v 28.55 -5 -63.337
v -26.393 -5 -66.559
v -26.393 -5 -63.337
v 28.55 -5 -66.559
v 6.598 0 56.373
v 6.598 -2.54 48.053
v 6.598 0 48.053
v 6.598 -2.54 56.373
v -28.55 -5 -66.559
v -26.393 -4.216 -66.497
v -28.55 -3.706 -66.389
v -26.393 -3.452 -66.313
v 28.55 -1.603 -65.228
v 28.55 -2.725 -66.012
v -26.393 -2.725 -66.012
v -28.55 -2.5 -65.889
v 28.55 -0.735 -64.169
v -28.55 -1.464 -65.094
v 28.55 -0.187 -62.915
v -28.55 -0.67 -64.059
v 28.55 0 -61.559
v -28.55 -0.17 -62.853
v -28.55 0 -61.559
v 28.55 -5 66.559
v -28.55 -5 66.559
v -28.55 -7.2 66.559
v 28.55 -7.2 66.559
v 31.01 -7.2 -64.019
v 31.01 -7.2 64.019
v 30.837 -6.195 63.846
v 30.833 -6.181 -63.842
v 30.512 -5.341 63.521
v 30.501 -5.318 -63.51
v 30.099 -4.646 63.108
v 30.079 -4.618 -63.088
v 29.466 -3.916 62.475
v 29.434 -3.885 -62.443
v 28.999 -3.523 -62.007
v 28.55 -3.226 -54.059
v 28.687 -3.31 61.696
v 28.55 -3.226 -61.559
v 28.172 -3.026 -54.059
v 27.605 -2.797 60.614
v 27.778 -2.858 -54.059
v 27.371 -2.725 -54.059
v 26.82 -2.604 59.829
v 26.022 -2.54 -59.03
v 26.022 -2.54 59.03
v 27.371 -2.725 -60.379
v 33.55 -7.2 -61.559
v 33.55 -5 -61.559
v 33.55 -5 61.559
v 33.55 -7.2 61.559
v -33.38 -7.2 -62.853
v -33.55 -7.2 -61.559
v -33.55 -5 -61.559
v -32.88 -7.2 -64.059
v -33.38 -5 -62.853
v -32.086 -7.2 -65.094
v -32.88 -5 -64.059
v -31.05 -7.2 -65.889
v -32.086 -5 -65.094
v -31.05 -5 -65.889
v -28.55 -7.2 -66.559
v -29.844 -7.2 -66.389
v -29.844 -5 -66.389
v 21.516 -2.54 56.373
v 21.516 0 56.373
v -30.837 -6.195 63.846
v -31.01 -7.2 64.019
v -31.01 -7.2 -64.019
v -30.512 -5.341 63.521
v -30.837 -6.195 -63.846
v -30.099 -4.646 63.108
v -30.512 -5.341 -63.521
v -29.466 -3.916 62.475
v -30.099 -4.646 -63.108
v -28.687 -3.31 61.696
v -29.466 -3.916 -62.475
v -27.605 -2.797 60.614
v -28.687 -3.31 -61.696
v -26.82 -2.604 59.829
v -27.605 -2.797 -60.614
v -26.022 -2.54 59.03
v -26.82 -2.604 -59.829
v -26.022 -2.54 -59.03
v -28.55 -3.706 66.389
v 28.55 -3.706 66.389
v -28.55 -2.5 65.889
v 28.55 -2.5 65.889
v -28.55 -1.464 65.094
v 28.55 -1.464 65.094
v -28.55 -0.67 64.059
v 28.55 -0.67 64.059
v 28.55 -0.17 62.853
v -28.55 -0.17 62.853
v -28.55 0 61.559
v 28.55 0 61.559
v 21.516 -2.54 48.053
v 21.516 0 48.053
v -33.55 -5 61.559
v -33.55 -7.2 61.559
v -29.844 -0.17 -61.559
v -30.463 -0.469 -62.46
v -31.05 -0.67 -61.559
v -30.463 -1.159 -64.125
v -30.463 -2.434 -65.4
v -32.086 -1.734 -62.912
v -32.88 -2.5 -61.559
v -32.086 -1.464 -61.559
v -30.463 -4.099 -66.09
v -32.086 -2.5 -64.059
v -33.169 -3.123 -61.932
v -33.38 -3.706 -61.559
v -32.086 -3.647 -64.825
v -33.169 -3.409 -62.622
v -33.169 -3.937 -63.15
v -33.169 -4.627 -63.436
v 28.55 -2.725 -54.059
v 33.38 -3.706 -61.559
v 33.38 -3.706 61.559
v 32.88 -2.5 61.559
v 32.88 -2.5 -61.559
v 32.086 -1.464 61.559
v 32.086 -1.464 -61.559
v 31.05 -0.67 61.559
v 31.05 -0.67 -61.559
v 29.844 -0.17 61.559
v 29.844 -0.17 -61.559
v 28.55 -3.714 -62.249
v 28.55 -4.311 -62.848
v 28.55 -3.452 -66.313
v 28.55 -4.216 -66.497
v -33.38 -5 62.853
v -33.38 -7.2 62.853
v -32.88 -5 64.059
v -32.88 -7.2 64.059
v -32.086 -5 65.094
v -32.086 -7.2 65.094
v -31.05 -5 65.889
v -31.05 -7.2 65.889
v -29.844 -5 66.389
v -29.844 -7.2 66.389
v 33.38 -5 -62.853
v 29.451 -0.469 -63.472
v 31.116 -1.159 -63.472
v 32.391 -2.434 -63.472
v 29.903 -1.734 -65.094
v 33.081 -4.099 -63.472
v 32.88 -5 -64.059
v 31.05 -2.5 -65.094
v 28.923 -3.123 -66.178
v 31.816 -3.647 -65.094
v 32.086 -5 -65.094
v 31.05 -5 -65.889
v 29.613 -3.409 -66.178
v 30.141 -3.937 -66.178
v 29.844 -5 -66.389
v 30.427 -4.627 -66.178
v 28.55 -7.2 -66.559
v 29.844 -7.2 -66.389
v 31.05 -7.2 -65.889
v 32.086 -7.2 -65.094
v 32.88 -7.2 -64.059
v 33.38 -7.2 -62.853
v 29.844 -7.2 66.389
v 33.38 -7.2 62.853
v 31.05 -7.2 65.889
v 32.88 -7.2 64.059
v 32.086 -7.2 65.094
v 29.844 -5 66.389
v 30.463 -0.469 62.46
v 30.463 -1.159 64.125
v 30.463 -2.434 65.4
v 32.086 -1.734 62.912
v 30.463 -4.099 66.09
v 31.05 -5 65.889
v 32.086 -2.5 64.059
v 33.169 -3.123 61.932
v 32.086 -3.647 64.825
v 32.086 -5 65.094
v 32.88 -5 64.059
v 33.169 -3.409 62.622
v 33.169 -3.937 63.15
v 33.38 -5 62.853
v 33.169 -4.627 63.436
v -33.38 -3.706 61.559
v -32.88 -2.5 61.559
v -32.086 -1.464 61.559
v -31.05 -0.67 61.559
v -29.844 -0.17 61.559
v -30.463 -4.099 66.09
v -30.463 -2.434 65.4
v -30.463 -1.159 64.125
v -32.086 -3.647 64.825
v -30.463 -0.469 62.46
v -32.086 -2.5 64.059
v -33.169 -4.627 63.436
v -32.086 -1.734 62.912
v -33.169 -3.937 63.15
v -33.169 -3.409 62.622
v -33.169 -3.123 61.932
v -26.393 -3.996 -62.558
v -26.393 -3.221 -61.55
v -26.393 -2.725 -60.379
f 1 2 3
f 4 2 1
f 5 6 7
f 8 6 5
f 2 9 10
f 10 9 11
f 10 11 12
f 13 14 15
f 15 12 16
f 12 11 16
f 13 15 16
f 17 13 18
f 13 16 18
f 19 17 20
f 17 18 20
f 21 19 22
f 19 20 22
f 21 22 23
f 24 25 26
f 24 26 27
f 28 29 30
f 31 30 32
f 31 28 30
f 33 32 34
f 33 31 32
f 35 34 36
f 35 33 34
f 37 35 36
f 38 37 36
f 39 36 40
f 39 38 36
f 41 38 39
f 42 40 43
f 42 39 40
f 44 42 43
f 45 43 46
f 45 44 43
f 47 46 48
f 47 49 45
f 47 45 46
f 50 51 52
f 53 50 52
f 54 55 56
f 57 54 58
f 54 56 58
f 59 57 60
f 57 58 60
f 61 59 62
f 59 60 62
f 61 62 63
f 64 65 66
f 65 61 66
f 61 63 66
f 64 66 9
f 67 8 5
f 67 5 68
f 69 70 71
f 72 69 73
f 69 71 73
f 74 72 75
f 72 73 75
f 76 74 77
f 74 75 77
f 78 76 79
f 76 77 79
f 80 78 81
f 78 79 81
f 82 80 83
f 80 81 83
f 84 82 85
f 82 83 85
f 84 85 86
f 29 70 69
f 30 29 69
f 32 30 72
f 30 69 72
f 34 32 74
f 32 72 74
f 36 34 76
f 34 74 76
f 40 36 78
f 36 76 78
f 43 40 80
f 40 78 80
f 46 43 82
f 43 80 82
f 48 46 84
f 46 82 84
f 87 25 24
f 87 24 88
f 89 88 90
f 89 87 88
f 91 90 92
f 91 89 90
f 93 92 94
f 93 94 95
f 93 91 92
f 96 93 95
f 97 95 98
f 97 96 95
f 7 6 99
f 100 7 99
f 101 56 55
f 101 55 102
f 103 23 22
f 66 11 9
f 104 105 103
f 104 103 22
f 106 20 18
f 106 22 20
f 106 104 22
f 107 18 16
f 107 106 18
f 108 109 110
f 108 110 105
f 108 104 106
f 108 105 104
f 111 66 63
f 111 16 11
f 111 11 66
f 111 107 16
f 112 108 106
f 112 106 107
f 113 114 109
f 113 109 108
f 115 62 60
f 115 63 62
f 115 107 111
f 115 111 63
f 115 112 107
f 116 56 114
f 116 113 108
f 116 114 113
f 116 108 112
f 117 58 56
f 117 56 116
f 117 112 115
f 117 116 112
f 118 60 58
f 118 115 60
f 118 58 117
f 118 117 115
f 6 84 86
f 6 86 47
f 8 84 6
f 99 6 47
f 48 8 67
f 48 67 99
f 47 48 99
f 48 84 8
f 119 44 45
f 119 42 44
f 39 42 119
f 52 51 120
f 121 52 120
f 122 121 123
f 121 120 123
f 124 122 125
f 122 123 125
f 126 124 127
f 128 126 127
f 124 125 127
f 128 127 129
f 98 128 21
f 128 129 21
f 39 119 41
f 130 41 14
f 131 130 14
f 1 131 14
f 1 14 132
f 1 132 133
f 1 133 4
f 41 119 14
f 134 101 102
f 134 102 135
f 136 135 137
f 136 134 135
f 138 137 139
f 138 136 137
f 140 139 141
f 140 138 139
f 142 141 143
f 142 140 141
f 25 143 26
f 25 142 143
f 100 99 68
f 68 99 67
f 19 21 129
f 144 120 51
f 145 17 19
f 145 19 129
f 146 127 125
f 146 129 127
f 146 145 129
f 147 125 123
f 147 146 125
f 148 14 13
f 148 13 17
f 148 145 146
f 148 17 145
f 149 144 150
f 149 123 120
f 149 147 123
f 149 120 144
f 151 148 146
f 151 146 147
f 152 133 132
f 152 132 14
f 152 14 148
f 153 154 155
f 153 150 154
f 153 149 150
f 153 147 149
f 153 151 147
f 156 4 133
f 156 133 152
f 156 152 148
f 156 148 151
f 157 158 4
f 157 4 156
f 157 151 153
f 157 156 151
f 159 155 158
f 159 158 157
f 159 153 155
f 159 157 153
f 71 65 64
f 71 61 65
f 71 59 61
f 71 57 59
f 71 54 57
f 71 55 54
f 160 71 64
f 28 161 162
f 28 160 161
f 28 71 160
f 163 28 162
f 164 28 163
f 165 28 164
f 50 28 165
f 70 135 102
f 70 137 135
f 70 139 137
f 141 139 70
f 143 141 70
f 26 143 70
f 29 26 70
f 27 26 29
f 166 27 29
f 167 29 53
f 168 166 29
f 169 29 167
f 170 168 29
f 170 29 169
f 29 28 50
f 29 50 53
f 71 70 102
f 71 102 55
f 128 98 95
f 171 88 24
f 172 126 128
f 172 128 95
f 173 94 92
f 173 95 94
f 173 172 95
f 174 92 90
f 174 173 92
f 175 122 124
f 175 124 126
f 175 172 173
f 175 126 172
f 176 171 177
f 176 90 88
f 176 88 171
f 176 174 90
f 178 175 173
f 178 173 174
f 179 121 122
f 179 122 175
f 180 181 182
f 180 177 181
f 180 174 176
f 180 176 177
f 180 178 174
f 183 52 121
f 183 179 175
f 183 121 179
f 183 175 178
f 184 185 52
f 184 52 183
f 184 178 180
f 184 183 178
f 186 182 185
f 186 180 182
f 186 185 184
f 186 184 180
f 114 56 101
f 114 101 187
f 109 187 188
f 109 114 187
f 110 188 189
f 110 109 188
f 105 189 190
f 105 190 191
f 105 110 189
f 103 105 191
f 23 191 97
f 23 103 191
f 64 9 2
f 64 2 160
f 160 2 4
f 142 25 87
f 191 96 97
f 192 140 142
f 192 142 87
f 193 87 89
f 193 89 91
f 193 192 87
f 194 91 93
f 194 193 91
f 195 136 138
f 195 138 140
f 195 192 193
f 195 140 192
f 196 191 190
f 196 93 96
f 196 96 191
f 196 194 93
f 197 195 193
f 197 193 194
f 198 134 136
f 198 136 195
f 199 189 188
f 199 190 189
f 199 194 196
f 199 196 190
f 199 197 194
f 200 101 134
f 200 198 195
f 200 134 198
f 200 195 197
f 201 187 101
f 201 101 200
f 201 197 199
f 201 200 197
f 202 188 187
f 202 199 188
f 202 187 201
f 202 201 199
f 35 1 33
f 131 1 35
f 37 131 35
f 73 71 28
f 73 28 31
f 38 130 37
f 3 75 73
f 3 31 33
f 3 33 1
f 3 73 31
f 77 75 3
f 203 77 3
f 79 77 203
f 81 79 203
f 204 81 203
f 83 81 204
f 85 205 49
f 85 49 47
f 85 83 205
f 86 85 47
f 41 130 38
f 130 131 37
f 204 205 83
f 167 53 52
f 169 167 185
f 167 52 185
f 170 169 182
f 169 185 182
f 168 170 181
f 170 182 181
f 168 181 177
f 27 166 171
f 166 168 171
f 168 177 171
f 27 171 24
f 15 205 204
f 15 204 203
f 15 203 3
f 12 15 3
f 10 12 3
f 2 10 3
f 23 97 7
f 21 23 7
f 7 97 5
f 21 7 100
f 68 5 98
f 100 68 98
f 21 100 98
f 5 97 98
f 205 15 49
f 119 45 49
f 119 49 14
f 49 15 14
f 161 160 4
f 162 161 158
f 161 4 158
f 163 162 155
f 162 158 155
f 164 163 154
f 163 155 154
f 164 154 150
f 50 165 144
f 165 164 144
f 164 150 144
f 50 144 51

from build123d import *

# Parameters (mm, degrees)
F0_W         = 67.1
F0_H         = 133.1177479803
F1_DEPTH     = 7.2
F2_T         = -2.54
F3_T1_DEPTH  = 123.1177479803
F3_T3_DEPTH  = 57.1
F3_T5_DEPTH  = 14.7
F3_S9_W      = 5.1
F3_S9_H      = 5.1
F3_T10_DEPTH = 5.1
F3_S15_W     = 5.1
F3_S15_H     = 5.1
F3_T16_DEPTH = 5.1
F3_S21_W     = 5.1
F3_S21_H     = 5.1
F3_T22_DEPTH = 5.1
F3_S27_W     = 5.1
F3_S27_H     = 5.1
F3_T28_DEPTH = 5.1
F3_T31_DEPTH = 128.0377479803
F3_T33_DEPTH = 62.02
F3_T39_DEPTH = 140.5088144944
F3_T43_DEPTH = 74.4910665141
F3_T50_DEPTH = 140.5088144944
F3_T54_DEPTH = 74.4910665141
F3_T61_DEPTH = 74.4910665141
F3_T65_DEPTH = 140.5088144944
F3_T72_DEPTH = 74.4910665141
F3_T76_DEPTH = 140.5088144944
F4_W         = 14.9180325679
F4_H         = 8.3196759224
F5_DEPTH     = 12.5
F6_W         = 54.943443346
F6_H         = 2.2745899577
F7_DEPTH     = 12.5


# Not quite as in the source:
# - a fillet or chamfer that OpenCascade refuses, or shapes differently, is made with other operations: its cross-section is extruded or revolved along the edge and cut away or added


with BuildPart() as f1:
    # F0 (on Front) → F1 (new body)
    with BuildSketch(Plane.XZ):
        Rectangle(F0_W, F0_H)
    extrude(amount=F1_DEPTH)

    # F2
    f2_openings = [f1.faces().sort_by_distance(p)[0] for p in [
        (0, -7.2, 0),
    ]]
    offset(amount=F2_T, openings=f2_openings)

    # F3: fillet of radius 5 on 12 edges, made by hand

    # F3_s2 → F3_t1 (cut)
    with BuildSketch(Plane.XY.offset(-61.5588739901)):
        with BuildLine():
            ThreePointArc((-33.55, -5), (-32.0855339059, -1.4644660941), (-28.55, 0))
            Line((-28.55, 0), (-28.55, 0.1))
            Line((-28.55, 0.1), (-33.65, 0.1))
            Line((-33.65, 0.1), (-33.65, -5))
            Line((-33.65, -5), (-33.55, -5))
        make_face()
        with BuildLine():
            ThreePointArc((33.55, -5), (32.0855339059, -1.4644660941), (28.55, 0))
            Line((28.55, 0), (28.55, 0.1))
            Line((28.55, 0.1), (33.65, 0.1))
            Line((33.65, 0.1), (33.65, -5))
            Line((33.65, -5), (33.55, -5))
        make_face()
    extrude(amount=F3_T1_DEPTH, mode=Mode.SUBTRACT)

    # F3_s4 → F3_t3 (cut)
    with BuildSketch(Plane.YZ.offset(-28.55)):
        with BuildLine():
            ThreePointArc((-5, -66.5588739901), (-1.4644660941, -65.0944078961), (0, -61.5588739901))
            Line((0, -61.5588739901), (0.1, -61.5588739901))
            Line((0.1, -61.5588739901), (0.1, -66.6588739901))
            Line((0.1, -66.6588739901), (-5, -66.6588739901))
            Line((-5, -66.6588739901), (-5, -66.5588739901))
        make_face()
        with BuildLine():
            ThreePointArc((-5, 66.5588739901), (-1.4644660941, 65.0944078961), (0, 61.5588739901))
            Line((0, 61.5588739901), (0.1, 61.5588739901))
            Line((0.1, 61.5588739901), (0.1, 66.6588739901))
            Line((0.1, 66.6588739901), (-5, 66.6588739901))
            Line((-5, 66.6588739901), (-5, 66.5588739901))
        make_face()
    extrude(amount=F3_T3_DEPTH, mode=Mode.SUBTRACT)

    # F3_s6 → F3_t5 (cut)
    with BuildSketch(Plane.XZ.offset(5)):
        with BuildLine():
            ThreePointArc((33.55, 61.5588739901), (32.0855339059, 65.0944078961), (28.55, 66.5588739901))
            Line((28.55, 66.5588739901), (28.55, 66.6588739901))
            Line((28.55, 66.6588739901), (33.65, 66.6588739901))
            Line((33.65, 66.6588739901), (33.65, 61.5588739901))
            Line((33.65, 61.5588739901), (33.55, 61.5588739901))
        make_face()
        with BuildLine():
            ThreePointArc((-33.55, 61.5588739901), (-32.0855339059, 65.0944078961), (-28.55, 66.5588739901))
            Line((-28.55, 66.5588739901), (-28.55, 66.6588739901))
            Line((-28.55, 66.6588739901), (-33.65, 66.6588739901))
            Line((-33.65, 66.6588739901), (-33.65, 61.5588739901))
            Line((-33.65, 61.5588739901), (-33.55, 61.5588739901))
        make_face()
        with BuildLine():
            ThreePointArc((-33.55, -61.5588739901), (-32.0855339059, -65.0944078961), (-28.55, -66.5588739901))
            Line((-28.55, -66.5588739901), (-28.55, -66.6588739901))
            Line((-28.55, -66.6588739901), (-33.65, -66.6588739901))
            Line((-33.65, -66.6588739901), (-33.65, -61.5588739901))
            Line((-33.65, -61.5588739901), (-33.55, -61.5588739901))
        make_face()
        with BuildLine():
            ThreePointArc((28.55, -66.5588739901), (32.0855339059, -65.0944078961), (33.55, -61.5588739901))
            Line((33.55, -61.5588739901), (33.65, -61.5588739901))
            Line((33.65, -61.5588739901), (33.65, -66.6588739901))
            Line((33.65, -66.6588739901), (28.55, -66.6588739901))
            Line((28.55, -66.6588739901), (28.55, -66.5588739901))
        make_face()
    extrude(amount=F3_T5_DEPTH, mode=Mode.SUBTRACT)


with BuildPart() as f3_tool8:
    # F3_s9 → F3_t10 (new body)
    with BuildSketch(Plane.YZ.offset(-28.55)):
        with Locations((-2.45, 64.1088739901)):
            Rectangle(F3_S9_W, F3_S9_H)
    extrude(amount=-F3_T10_DEPTH)

    # F3_s11 → F3_t12 (revolve, cut)
    with BuildSketch(Plane(origin=(-28.55, -5, 61.5588739901), x_dir=(0, -0.7071067812, -0.7071067812), z_dir=(0, 0.7071067812, -0.7071067812))):
        with BuildLine():
            ThreePointArc((0, -5), (5, 0), (0, 5))
            Line((0, 5), (0, -5))
        make_face()
    revolve(axis=Axis((-28.55, -5, 61.5588739901), (-1, 0, 0)), mode=Mode.SUBTRACT)


with BuildPart() as f1_1:
    add(f1.part)

    # F3_t7: cut F3_tool8
    add(f3_tool8.part, mode=Mode.SUBTRACT)


with BuildPart() as f3_tool14:
    # F3_s15 → F3_t16 (new body)
    with BuildSketch(Plane.YZ.offset(-28.55)):
        with Locations((-2.45, -64.1088739901)):
            Rectangle(F3_S15_W, F3_S15_H)
    extrude(amount=-F3_T16_DEPTH)

    # F3_s17 → F3_t18 (revolve, cut)
    with BuildSketch(Plane(origin=(-28.55, -5, -61.5588739901), x_dir=(0, -0.7071067812, 0.7071067812), z_dir=(0, -0.7071067812, -0.7071067812))):
        with BuildLine():
            ThreePointArc((0, -5), (5, 0), (0, 5))
            Line((0, 5), (0, -5))
        make_face()
    revolve(axis=Axis((-28.55, -5, -61.5588739901), (-1, 0, 0)), mode=Mode.SUBTRACT)


with BuildPart() as f1_2:
    add(f1_1.part)

    # F3_t13: cut F3_tool14
    add(f3_tool14.part, mode=Mode.SUBTRACT)


with BuildPart() as f3_tool20:
    # F3_s21 → F3_t22 (new body)
    with BuildSketch(Plane.XY.offset(-61.5588739901)):
        with Locations((31.1, -2.45)):
            Rectangle(F3_S21_W, F3_S21_H)
    extrude(amount=-F3_T22_DEPTH)

    # F3_s23 → F3_t24 (revolve, cut)
    with BuildSketch(Plane(origin=(28.55, -5, -61.5588739901), x_dir=(-0.7071067812, -0.7071067812, 0), z_dir=(0.7071067812, -0.7071067812, 0))):
        with BuildLine():
            ThreePointArc((0, -5), (5, 0), (0, 5))
            Line((0, 5), (0, -5))
        make_face()
    revolve(axis=Axis((28.55, -5, -61.5588739901), (0, 0, -1)), mode=Mode.SUBTRACT)


with BuildPart() as f1_3:
    add(f1_2.part)

    # F3_t19: cut F3_tool20
    add(f3_tool20.part, mode=Mode.SUBTRACT)


with BuildPart() as f3_tool26:
    # F3_s27 → F3_t28 (new body)
    with BuildSketch(Plane.YZ.offset(28.55)):
        with Locations((-2.45, 64.1088739901)):
            Rectangle(F3_S27_W, F3_S27_H)
    extrude(amount=F3_T28_DEPTH)

    # F3_s29 → F3_t30 (revolve, cut)
    with BuildSketch(Plane(origin=(28.55, -5, 61.5588739901), x_dir=(0, -0.7071067812, -0.7071067812), z_dir=(0, -0.7071067812, 0.7071067812))):
        with BuildLine():
            ThreePointArc((0, -5), (5, 0), (0, 5))
            Line((0, 5), (0, -5))
        make_face()
    revolve(axis=Axis((28.55, -5, 61.5588739901), (1, 0, 0)), mode=Mode.SUBTRACT)


with BuildPart() as f1_4:
    add(f1_3.part)

    # F3_t25: cut F3_tool26
    add(f3_tool26.part, mode=Mode.SUBTRACT)

    # F3_s32 → F3_t31 (join)
    with BuildSketch(Plane.XY.offset(-64.0188739901)):
        with BuildLine():
            ThreePointArc((-31.01, -7.2), (-29.4347830275, -3.8862348187), (-26.0215733943, -2.54))
            Line((-26.0215733943, -2.54), (-26.0215733943, -2.44))
            Line((-26.0215733943, -2.44), (-31.01, -2.44))
            Line((-31.01, -2.44), (-31.11, -2.54))
            ThreePointArc((-31.11, -2.54), (-31.11, -4.87), (-31.1097685321, -7.1932))
            Line((-31.1097685321, -7.1932), (-31.01, -7.2))
        make_face()
        with BuildLine():
            ThreePointArc((31.01, -7.2), (29.4347830275, -3.8862348187), (26.0215733943, -2.54))
            Line((26.0215733943, -2.54), (26.0215733943, -2.44))
            Line((26.0215733943, -2.44), (31.01, -2.44))
            Line((31.01, -2.44), (31.11, -2.54))
            ThreePointArc((31.11, -2.54), (31.11, -4.87), (31.1097685321, -7.1932))
            Line((31.1097685321, -7.1932), (31.01, -7.2))
        make_face()
    extrude(amount=F3_T31_DEPTH)

    # F3_s34 → F3_t33 (join)
    with BuildSketch(Plane.YZ.offset(-31.01)):
        with BuildLine():
            ThreePointArc((-7.2, -64.0188739901), (-3.8862348187, -62.4436570177), (-2.54, -59.0304473845))
            Line((-2.54, -59.0304473845), (-2.44, -59.0304473845))
            Line((-2.44, -59.0304473845), (-2.44, -64.0188739901))
            Line((-2.44, -64.0188739901), (-2.54, -64.1188739901))
            ThreePointArc((-2.54, -64.1188739901), (-4.87, -64.1188739901), (-7.1932, -64.1186425223))
            Line((-7.1932, -64.1186425223), (-7.2, -64.0188739901))
        make_face()
        with BuildLine():
            ThreePointArc((-7.2, 64.0188739901), (-3.8862348187, 62.4436570177), (-2.54, 59.0304473845))
            Line((-2.54, 59.0304473845), (-2.44, 59.0304473845))
            Line((-2.44, 59.0304473845), (-2.44, 64.0188739901))
            Line((-2.44, 64.0188739901), (-2.54, 64.1188739901))
            ThreePointArc((-2.54, 64.1188739901), (-4.87, 64.1188739901), (-7.1932, 64.1186425223))
            Line((-7.1932, 64.1186425223), (-7.2, 64.0188739901))
        make_face()
    extrude(amount=F3_T33_DEPTH)


with BuildPart() as f3_tool37:
    # F3_s38 → F3_t39 (new body)
    with BuildSketch(Plane.XY.offset(76.4899405043)):
        with BuildLine():
            ThreePointArc((-31.01, -7.2), (-29.4347830275, -3.8862348187), (-26.0215733943, -2.54))
            Line((-26.0215733943, -2.54), (-26.0215733943, -2.44))
            Line((-26.0215733943, -2.44), (-31.01, -2.44))
            Line((-31.01, -2.44), (-31.11, -2.54))
            ThreePointArc((-31.11, -2.54), (-31.11, -4.87), (-31.1097685321, -7.1932))
            Line((-31.1097685321, -7.1932), (-31.01, -7.2))
        make_face()
    extrude(amount=-F3_T39_DEPTH)

    split(bisect_by=Plane.XY.offset(64.0188739901), keep=Keep.TOP)


with BuildPart() as f3_tool41:
    # F3_s42 → F3_t43 (new body)
    with BuildSketch(Plane.YZ.offset(31.01)):
        with BuildLine():
            ThreePointArc((-7.2, 64.0188739901), (-3.8862348187, 62.4436570177), (-2.54, 59.0304473845))
            Line((-2.54, 59.0304473845), (-2.44, 59.0304473845))
            Line((-2.44, 59.0304473845), (-2.44, 64.0188739901))
            Line((-2.44, 64.0188739901), (-2.54, 64.1188739901))
            ThreePointArc((-2.54, 64.1188739901), (-4.87, 64.1188739901), (-7.1932, 64.1186425223))
            Line((-7.1932, 64.1186425223), (-7.2, 64.0188739901))
        make_face()
    extrude(amount=-F3_T43_DEPTH)

    split(bisect_by=Plane.YZ.offset(-31.01), keep=Keep.BOTTOM)


with BuildPart() as f3_tool37_1:
    add(f3_tool37.part)

    # F3_t45: intersect F3_tool41
    add(f3_tool41.part, mode=Mode.INTERSECT)


with BuildPart() as f1_5:
    add(f1_4.part)

    # F3_t35: union F3_tool37
    add(f3_tool37_1.part)


with BuildPart() as f3_tool48:
    # F3_s49 → F3_t50 (new body)
    with BuildSketch(Plane.XY.offset(64.0188739901)):
        with BuildLine():
            ThreePointArc((-31.01, -7.2), (-29.4347830275, -3.8862348187), (-26.0215733943, -2.54))
            Line((-26.0215733943, -2.54), (-26.0215733943, -2.44))
            Line((-26.0215733943, -2.44), (-31.01, -2.44))
            Line((-31.01, -2.44), (-31.11, -2.54))
            ThreePointArc((-31.11, -2.54), (-31.11, -4.87), (-31.1097685321, -7.1932))
            Line((-31.1097685321, -7.1932), (-31.01, -7.2))
        make_face()
    extrude(amount=-F3_T50_DEPTH)

    split(bisect_by=Plane.XY.offset(-64.0188739901), keep=Keep.BOTTOM)


with BuildPart() as f3_tool52:
    # F3_s53 → F3_t54 (new body)
    with BuildSketch(Plane.YZ.offset(-43.4810665141)):
        with BuildLine():
            ThreePointArc((-7.2, -64.0188739901), (-3.8862348187, -62.4436570177), (-2.54, -59.0304473845))
            Line((-2.54, -59.0304473845), (-2.44, -59.0304473845))
            Line((-2.44, -59.0304473845), (-2.44, -64.0188739901))
            Line((-2.44, -64.0188739901), (-2.54, -64.1188739901))
            ThreePointArc((-2.54, -64.1188739901), (-4.87, -64.1188739901), (-7.1932, -64.1186425223))
            Line((-7.1932, -64.1186425223), (-7.2, -64.0188739901))
        make_face()
    extrude(amount=F3_T54_DEPTH)

    split(bisect_by=Plane.YZ.offset(-31.01), keep=Keep.BOTTOM)


with BuildPart() as f3_tool48_1:
    add(f3_tool48.part)

    # F3_t56: intersect F3_tool52
    add(f3_tool52.part, mode=Mode.INTERSECT)


with BuildPart() as f1_6:
    add(f1_5.part)

    # F3_t46: union F3_tool48
    add(f3_tool48_1.part)


with BuildPart() as f3_tool59:
    # F3_s60 → F3_t61 (new body)
    with BuildSketch(Plane.YZ.offset(-31.01)):
        with BuildLine():
            ThreePointArc((-7.2, -64.0188739901), (-3.8862348187, -62.4436570177), (-2.54, -59.0304473845))
            Line((-2.54, -59.0304473845), (-2.44, -59.0304473845))
            Line((-2.44, -59.0304473845), (-2.44, -64.0188739901))
            Line((-2.44, -64.0188739901), (-2.54, -64.1188739901))
            ThreePointArc((-2.54, -64.1188739901), (-4.87, -64.1188739901), (-7.1932, -64.1186425223))
            Line((-7.1932, -64.1186425223), (-7.2, -64.0188739901))
        make_face()
    extrude(amount=F3_T61_DEPTH)

    split(bisect_by=Plane.YZ.offset(31.01), keep=Keep.TOP)


with BuildPart() as f3_tool63:
    # F3_s64 → F3_t65 (new body)
    with BuildSketch(Plane.XY.offset(-76.4899405043)):
        with BuildLine():
            ThreePointArc((31.01, -7.2), (29.4347830275, -3.8862348187), (26.0215733943, -2.54))
            Line((26.0215733943, -2.54), (26.0215733943, -2.44))
            Line((26.0215733943, -2.44), (31.01, -2.44))
            Line((31.01, -2.44), (31.11, -2.54))
            ThreePointArc((31.11, -2.54), (31.11, -4.87), (31.1097685321, -7.1932))
            Line((31.1097685321, -7.1932), (31.01, -7.2))
        make_face()
    extrude(amount=F3_T65_DEPTH)

    split(bisect_by=Plane.XY.offset(-64.0188739901), keep=Keep.BOTTOM)


with BuildPart() as f3_tool59_1:
    add(f3_tool59.part)

    # F3_t67: intersect F3_tool63
    add(f3_tool63.part, mode=Mode.INTERSECT)


with BuildPart() as f1_7:
    add(f1_6.part)

    # F3_t57: union F3_tool59
    add(f3_tool59_1.part)


with BuildPart() as f3_tool70:
    # F3_s71 → F3_t72 (new body)
    with BuildSketch(Plane.YZ.offset(43.4810665141)):
        with BuildLine():
            ThreePointArc((-7.2, 64.0188739901), (-3.8862348187, 62.4436570177), (-2.54, 59.0304473845))
            Line((-2.54, 59.0304473845), (-2.44, 59.0304473845))
            Line((-2.44, 59.0304473845), (-2.44, 64.0188739901))
            Line((-2.44, 64.0188739901), (-2.54, 64.1188739901))
            ThreePointArc((-2.54, 64.1188739901), (-4.87, 64.1188739901), (-7.1932, 64.1186425223))
            Line((-7.1932, 64.1186425223), (-7.2, 64.0188739901))
        make_face()
    extrude(amount=-F3_T72_DEPTH)

    split(bisect_by=Plane.YZ.offset(31.01), keep=Keep.TOP)


with BuildPart() as f3_tool74:
    # F3_s75 → F3_t76 (new body)
    with BuildSketch(Plane.XY.offset(-64.0188739901)):
        with BuildLine():
            ThreePointArc((31.01, -7.2), (29.4347830275, -3.8862348187), (26.0215733943, -2.54))
            Line((26.0215733943, -2.54), (26.0215733943, -2.44))
            Line((26.0215733943, -2.44), (31.01, -2.44))
            Line((31.01, -2.44), (31.11, -2.54))
            ThreePointArc((31.11, -2.54), (31.11, -4.87), (31.1097685321, -7.1932))
            Line((31.1097685321, -7.1932), (31.01, -7.2))
        make_face()
    extrude(amount=F3_T76_DEPTH)

    split(bisect_by=Plane.XY.offset(64.0188739901), keep=Keep.TOP)


with BuildPart() as f3_tool70_1:
    add(f3_tool70.part)

    # F3_t78: intersect F3_tool74
    add(f3_tool74.part, mode=Mode.INTERSECT)


with BuildPart() as f1_8:
    add(f1_7.part)

    # F3_t68: union F3_tool70
    add(f3_tool70_1.part)

    # F4 (on face) → F5 (cut, symmetric)
    with BuildSketch(Plane.XZ.offset(2.54)):
        with Locations((14.0573775861, 52.2131174803)):
            Rectangle(F4_W, F4_H)
    extrude(amount=F5_DEPTH, both=True, mode=Mode.SUBTRACT)

    # F6 (on face) → F7 (cut, symmetric)
    with BuildSketch(Plane(origin=(0, 0, -66.5588739901), x_dir=(1, 0, 0), z_dir=(0, 0, -1))):
        with Locations((1.078278327, 3.8627050212)):
            Rectangle(F6_W, F6_H)
    extrude(amount=F7_DEPTH, both=True, mode=Mode.SUBTRACT)


solid = f1_8.part
